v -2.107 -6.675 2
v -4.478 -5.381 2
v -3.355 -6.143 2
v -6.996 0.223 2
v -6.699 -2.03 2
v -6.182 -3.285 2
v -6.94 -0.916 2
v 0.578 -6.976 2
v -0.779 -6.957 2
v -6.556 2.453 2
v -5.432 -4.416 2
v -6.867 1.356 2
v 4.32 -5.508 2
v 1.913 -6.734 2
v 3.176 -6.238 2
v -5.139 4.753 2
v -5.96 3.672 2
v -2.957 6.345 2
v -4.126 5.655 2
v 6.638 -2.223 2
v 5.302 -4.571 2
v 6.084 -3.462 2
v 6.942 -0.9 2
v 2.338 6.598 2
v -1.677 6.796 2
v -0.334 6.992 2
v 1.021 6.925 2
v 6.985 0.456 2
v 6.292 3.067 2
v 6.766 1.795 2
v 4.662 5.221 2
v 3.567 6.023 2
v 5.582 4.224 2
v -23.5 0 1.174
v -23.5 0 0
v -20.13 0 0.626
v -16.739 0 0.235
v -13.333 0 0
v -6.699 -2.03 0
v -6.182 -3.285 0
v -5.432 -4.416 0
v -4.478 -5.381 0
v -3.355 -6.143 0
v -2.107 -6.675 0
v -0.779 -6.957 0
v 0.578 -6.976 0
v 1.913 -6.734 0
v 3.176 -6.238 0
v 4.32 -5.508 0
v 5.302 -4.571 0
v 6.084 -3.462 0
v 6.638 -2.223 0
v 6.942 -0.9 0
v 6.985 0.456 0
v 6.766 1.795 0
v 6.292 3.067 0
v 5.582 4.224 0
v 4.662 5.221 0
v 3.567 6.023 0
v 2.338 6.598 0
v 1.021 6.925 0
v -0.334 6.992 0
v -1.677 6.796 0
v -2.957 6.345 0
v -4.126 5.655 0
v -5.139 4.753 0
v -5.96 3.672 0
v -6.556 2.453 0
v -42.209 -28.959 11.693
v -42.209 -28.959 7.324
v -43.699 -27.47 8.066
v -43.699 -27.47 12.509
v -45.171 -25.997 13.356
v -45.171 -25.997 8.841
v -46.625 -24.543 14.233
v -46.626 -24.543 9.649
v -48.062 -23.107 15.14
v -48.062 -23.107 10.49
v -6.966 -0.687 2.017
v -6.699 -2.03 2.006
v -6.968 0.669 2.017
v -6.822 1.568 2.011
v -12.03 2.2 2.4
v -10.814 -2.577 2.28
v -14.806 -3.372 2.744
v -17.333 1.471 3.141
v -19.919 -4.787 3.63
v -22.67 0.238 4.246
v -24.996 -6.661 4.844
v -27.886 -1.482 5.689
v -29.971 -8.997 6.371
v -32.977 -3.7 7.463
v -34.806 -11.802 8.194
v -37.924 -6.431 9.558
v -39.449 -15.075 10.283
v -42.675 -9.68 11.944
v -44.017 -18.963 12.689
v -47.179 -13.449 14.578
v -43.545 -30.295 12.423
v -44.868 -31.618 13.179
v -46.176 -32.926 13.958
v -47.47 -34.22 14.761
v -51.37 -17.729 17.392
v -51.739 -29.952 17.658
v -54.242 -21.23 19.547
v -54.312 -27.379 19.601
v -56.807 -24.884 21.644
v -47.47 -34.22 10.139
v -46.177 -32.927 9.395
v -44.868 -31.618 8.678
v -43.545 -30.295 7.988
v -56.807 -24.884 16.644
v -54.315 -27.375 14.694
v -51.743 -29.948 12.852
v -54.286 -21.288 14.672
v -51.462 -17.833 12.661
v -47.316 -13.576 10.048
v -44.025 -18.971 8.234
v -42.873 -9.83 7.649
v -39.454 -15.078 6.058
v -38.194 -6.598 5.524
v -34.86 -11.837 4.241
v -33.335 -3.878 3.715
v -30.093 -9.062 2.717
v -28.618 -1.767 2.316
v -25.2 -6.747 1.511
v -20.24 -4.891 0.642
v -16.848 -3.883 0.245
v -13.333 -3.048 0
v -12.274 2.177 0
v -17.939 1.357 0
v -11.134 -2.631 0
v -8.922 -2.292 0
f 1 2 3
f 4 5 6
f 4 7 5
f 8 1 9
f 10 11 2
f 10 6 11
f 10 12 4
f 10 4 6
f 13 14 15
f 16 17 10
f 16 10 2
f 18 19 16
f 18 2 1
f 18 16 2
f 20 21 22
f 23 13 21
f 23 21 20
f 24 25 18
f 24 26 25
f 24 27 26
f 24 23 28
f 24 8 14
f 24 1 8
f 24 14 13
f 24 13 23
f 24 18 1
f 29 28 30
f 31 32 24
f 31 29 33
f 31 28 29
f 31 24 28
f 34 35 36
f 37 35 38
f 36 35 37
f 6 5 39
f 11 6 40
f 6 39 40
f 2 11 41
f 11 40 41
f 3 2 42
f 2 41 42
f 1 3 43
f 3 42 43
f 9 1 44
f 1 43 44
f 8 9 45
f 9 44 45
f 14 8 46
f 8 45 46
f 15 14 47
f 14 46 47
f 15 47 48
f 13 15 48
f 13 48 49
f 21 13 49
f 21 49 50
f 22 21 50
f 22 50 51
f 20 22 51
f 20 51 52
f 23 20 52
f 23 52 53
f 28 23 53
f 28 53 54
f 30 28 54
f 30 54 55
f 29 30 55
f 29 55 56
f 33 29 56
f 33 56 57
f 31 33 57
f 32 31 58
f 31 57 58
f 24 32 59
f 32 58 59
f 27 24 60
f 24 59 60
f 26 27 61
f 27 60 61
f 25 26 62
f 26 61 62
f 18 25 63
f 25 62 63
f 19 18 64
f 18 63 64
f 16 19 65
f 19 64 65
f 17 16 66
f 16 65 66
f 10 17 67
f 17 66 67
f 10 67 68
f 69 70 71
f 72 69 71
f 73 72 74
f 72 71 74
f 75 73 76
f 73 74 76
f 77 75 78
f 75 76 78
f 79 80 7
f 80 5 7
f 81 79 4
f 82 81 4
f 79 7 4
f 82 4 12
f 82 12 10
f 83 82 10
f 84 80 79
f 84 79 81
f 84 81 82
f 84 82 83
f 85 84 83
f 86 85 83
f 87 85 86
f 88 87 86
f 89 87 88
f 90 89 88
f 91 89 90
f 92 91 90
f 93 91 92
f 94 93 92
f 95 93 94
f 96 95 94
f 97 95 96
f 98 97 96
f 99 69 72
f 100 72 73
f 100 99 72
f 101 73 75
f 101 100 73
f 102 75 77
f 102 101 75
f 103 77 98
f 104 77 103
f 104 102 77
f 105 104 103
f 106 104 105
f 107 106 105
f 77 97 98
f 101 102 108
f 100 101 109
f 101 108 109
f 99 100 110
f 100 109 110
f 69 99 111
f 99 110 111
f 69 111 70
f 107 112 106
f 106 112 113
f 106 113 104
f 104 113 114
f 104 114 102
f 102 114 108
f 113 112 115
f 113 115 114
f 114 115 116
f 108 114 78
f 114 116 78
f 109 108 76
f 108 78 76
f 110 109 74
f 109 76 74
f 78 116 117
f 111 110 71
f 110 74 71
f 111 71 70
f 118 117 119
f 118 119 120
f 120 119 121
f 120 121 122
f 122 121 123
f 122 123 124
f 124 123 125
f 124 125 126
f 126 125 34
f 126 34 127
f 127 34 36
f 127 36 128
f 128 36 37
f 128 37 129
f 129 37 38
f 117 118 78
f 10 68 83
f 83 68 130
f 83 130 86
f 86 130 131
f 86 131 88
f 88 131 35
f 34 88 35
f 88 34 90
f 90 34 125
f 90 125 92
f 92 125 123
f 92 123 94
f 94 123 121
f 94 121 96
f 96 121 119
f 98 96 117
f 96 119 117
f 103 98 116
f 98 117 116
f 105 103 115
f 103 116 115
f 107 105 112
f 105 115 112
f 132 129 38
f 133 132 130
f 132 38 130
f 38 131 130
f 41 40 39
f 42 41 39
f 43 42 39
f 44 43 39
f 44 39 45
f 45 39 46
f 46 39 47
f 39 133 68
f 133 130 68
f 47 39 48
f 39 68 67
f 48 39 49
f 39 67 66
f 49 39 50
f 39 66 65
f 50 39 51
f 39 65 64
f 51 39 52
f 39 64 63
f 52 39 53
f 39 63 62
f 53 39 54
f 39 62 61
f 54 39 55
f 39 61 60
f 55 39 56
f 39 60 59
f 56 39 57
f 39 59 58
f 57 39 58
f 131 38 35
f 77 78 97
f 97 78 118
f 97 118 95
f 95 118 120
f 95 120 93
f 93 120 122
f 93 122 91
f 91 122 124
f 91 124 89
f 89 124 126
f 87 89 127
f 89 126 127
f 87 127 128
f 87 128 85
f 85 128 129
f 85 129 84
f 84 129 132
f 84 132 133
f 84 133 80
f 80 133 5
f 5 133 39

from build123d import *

# Parameters (mm, degrees)
BOSS_EXTRU_2_DEPTH           = 2
BOSS_EXTRU_3_DEPTH           = 45
ENL_V_MAT_EXTRU_3_DEPTH      = 5
ENL_V_MAT_EXTRU_3_DEPTH_BACK = 81.143689392
ENL_V_MAT_EXTRU_4_DEPTH      = 70.76004634


with BuildPart() as part:
    # Esquisse3 → Boss.-Extru.2 (new body)
    with BuildSketch(Plane.XY):
        with BuildLine():
            ThreePointArc((7, 0), (1.246257582, 6.888166813), (-6.556240583, 2.452694319))
            ThreePointArc((-6.556240583, 2.452694319), (-6.99644453, 0.22307834), (-6.699170831, -2.030051767))
            ThreePointArc((-6.699170831, -2.030051767), (1.026110175, -6.924384298), (7, 0))
        make_face()
    extrude(amount=BOSS_EXTRU_2_DEPTH)

    # Esquisse3<3> → Boss.-Extru.3 (add)
    with BuildSketch(Plane.XY):
        with BuildLine():
            ThreePointArc((-6.556240583, 2.452694319), (-35.156121343, -4.82839961), (-56.806558544, -24.883974331))
            Line((-56.806558544, -24.883974331), (-47.470277823, -34.220255052))
            Line((-47.470277823, -34.220255052), (-42.209094679, -28.959071907))
            Line((-42.209094679, -28.959071907), (-48.061618993, -23.106547593))
            ThreePointArc((-48.061618993, -23.106547593), (-29.360618565, -8.682127194), (-6.699170831, -2.030051767))
            ThreePointArc((-6.699170831, -2.030051767), (-6.99644453, 0.22307834), (-6.556240583, 2.452694319))
        make_face()
    extrude(amount=BOSS_EXTRU_3_DEPTH)

    # Esquisse4 → Enlèv. mat.-Extru.3 (cut, two sides: drawn at the far end of the back side and taken through both)
    with BuildSketch(Plane(origin=(0, 0, 0), x_dir=(1, 0, 0), z_dir=(0, 1, 0)).offset(-ENL_V_MAT_EXTRU_3_DEPTH_BACK)):
        with BuildLine():
            Line((-6.556240583, -21.643777245), (-6.556240583, -2))
            ThreePointArc((-6.556240583, -2), (-33.331448935, -7.600933328), (-56.806558544, -21.643777245))
            Line((-56.806558544, -21.643777245), (-56.806558544, -45))
            Line((-56.806558544, -45), (-56.806558544, -53.527020644))
            Line((-56.806558544, -53.527020644), (-6.425184121, -53.527020644))
            Line((-6.425184121, -53.527020644), (-6.556240583, -21.643777245))
        make_face()
    extrude(amount=ENL_V_MAT_EXTRU_3_DEPTH + ENL_V_MAT_EXTRU_3_DEPTH_BACK, mode=Mode.SUBTRACT)

    # Esquisse4<4> → Enlèv. mat.-Extru.4 (cut, through all)
    with BuildSketch(Plane(origin=(0, 0, 0), x_dir=(1, 0, 0), z_dir=(0, 1, 0))):
        with BuildLine():
            ThreePointArc((-56.806558544, -16.643777245), (-36.412027531, -4.815736188), (-13.332856502, 0))
            Line((-13.332856502, 0), (-56.806558544, 0))
            Line((-56.806558544, 0), (-56.806558544, -16.643777245))
        make_face()
    extrude(amount=-ENL_V_MAT_EXTRU_4_DEPTH, mode=Mode.SUBTRACT)


solid = part.part
